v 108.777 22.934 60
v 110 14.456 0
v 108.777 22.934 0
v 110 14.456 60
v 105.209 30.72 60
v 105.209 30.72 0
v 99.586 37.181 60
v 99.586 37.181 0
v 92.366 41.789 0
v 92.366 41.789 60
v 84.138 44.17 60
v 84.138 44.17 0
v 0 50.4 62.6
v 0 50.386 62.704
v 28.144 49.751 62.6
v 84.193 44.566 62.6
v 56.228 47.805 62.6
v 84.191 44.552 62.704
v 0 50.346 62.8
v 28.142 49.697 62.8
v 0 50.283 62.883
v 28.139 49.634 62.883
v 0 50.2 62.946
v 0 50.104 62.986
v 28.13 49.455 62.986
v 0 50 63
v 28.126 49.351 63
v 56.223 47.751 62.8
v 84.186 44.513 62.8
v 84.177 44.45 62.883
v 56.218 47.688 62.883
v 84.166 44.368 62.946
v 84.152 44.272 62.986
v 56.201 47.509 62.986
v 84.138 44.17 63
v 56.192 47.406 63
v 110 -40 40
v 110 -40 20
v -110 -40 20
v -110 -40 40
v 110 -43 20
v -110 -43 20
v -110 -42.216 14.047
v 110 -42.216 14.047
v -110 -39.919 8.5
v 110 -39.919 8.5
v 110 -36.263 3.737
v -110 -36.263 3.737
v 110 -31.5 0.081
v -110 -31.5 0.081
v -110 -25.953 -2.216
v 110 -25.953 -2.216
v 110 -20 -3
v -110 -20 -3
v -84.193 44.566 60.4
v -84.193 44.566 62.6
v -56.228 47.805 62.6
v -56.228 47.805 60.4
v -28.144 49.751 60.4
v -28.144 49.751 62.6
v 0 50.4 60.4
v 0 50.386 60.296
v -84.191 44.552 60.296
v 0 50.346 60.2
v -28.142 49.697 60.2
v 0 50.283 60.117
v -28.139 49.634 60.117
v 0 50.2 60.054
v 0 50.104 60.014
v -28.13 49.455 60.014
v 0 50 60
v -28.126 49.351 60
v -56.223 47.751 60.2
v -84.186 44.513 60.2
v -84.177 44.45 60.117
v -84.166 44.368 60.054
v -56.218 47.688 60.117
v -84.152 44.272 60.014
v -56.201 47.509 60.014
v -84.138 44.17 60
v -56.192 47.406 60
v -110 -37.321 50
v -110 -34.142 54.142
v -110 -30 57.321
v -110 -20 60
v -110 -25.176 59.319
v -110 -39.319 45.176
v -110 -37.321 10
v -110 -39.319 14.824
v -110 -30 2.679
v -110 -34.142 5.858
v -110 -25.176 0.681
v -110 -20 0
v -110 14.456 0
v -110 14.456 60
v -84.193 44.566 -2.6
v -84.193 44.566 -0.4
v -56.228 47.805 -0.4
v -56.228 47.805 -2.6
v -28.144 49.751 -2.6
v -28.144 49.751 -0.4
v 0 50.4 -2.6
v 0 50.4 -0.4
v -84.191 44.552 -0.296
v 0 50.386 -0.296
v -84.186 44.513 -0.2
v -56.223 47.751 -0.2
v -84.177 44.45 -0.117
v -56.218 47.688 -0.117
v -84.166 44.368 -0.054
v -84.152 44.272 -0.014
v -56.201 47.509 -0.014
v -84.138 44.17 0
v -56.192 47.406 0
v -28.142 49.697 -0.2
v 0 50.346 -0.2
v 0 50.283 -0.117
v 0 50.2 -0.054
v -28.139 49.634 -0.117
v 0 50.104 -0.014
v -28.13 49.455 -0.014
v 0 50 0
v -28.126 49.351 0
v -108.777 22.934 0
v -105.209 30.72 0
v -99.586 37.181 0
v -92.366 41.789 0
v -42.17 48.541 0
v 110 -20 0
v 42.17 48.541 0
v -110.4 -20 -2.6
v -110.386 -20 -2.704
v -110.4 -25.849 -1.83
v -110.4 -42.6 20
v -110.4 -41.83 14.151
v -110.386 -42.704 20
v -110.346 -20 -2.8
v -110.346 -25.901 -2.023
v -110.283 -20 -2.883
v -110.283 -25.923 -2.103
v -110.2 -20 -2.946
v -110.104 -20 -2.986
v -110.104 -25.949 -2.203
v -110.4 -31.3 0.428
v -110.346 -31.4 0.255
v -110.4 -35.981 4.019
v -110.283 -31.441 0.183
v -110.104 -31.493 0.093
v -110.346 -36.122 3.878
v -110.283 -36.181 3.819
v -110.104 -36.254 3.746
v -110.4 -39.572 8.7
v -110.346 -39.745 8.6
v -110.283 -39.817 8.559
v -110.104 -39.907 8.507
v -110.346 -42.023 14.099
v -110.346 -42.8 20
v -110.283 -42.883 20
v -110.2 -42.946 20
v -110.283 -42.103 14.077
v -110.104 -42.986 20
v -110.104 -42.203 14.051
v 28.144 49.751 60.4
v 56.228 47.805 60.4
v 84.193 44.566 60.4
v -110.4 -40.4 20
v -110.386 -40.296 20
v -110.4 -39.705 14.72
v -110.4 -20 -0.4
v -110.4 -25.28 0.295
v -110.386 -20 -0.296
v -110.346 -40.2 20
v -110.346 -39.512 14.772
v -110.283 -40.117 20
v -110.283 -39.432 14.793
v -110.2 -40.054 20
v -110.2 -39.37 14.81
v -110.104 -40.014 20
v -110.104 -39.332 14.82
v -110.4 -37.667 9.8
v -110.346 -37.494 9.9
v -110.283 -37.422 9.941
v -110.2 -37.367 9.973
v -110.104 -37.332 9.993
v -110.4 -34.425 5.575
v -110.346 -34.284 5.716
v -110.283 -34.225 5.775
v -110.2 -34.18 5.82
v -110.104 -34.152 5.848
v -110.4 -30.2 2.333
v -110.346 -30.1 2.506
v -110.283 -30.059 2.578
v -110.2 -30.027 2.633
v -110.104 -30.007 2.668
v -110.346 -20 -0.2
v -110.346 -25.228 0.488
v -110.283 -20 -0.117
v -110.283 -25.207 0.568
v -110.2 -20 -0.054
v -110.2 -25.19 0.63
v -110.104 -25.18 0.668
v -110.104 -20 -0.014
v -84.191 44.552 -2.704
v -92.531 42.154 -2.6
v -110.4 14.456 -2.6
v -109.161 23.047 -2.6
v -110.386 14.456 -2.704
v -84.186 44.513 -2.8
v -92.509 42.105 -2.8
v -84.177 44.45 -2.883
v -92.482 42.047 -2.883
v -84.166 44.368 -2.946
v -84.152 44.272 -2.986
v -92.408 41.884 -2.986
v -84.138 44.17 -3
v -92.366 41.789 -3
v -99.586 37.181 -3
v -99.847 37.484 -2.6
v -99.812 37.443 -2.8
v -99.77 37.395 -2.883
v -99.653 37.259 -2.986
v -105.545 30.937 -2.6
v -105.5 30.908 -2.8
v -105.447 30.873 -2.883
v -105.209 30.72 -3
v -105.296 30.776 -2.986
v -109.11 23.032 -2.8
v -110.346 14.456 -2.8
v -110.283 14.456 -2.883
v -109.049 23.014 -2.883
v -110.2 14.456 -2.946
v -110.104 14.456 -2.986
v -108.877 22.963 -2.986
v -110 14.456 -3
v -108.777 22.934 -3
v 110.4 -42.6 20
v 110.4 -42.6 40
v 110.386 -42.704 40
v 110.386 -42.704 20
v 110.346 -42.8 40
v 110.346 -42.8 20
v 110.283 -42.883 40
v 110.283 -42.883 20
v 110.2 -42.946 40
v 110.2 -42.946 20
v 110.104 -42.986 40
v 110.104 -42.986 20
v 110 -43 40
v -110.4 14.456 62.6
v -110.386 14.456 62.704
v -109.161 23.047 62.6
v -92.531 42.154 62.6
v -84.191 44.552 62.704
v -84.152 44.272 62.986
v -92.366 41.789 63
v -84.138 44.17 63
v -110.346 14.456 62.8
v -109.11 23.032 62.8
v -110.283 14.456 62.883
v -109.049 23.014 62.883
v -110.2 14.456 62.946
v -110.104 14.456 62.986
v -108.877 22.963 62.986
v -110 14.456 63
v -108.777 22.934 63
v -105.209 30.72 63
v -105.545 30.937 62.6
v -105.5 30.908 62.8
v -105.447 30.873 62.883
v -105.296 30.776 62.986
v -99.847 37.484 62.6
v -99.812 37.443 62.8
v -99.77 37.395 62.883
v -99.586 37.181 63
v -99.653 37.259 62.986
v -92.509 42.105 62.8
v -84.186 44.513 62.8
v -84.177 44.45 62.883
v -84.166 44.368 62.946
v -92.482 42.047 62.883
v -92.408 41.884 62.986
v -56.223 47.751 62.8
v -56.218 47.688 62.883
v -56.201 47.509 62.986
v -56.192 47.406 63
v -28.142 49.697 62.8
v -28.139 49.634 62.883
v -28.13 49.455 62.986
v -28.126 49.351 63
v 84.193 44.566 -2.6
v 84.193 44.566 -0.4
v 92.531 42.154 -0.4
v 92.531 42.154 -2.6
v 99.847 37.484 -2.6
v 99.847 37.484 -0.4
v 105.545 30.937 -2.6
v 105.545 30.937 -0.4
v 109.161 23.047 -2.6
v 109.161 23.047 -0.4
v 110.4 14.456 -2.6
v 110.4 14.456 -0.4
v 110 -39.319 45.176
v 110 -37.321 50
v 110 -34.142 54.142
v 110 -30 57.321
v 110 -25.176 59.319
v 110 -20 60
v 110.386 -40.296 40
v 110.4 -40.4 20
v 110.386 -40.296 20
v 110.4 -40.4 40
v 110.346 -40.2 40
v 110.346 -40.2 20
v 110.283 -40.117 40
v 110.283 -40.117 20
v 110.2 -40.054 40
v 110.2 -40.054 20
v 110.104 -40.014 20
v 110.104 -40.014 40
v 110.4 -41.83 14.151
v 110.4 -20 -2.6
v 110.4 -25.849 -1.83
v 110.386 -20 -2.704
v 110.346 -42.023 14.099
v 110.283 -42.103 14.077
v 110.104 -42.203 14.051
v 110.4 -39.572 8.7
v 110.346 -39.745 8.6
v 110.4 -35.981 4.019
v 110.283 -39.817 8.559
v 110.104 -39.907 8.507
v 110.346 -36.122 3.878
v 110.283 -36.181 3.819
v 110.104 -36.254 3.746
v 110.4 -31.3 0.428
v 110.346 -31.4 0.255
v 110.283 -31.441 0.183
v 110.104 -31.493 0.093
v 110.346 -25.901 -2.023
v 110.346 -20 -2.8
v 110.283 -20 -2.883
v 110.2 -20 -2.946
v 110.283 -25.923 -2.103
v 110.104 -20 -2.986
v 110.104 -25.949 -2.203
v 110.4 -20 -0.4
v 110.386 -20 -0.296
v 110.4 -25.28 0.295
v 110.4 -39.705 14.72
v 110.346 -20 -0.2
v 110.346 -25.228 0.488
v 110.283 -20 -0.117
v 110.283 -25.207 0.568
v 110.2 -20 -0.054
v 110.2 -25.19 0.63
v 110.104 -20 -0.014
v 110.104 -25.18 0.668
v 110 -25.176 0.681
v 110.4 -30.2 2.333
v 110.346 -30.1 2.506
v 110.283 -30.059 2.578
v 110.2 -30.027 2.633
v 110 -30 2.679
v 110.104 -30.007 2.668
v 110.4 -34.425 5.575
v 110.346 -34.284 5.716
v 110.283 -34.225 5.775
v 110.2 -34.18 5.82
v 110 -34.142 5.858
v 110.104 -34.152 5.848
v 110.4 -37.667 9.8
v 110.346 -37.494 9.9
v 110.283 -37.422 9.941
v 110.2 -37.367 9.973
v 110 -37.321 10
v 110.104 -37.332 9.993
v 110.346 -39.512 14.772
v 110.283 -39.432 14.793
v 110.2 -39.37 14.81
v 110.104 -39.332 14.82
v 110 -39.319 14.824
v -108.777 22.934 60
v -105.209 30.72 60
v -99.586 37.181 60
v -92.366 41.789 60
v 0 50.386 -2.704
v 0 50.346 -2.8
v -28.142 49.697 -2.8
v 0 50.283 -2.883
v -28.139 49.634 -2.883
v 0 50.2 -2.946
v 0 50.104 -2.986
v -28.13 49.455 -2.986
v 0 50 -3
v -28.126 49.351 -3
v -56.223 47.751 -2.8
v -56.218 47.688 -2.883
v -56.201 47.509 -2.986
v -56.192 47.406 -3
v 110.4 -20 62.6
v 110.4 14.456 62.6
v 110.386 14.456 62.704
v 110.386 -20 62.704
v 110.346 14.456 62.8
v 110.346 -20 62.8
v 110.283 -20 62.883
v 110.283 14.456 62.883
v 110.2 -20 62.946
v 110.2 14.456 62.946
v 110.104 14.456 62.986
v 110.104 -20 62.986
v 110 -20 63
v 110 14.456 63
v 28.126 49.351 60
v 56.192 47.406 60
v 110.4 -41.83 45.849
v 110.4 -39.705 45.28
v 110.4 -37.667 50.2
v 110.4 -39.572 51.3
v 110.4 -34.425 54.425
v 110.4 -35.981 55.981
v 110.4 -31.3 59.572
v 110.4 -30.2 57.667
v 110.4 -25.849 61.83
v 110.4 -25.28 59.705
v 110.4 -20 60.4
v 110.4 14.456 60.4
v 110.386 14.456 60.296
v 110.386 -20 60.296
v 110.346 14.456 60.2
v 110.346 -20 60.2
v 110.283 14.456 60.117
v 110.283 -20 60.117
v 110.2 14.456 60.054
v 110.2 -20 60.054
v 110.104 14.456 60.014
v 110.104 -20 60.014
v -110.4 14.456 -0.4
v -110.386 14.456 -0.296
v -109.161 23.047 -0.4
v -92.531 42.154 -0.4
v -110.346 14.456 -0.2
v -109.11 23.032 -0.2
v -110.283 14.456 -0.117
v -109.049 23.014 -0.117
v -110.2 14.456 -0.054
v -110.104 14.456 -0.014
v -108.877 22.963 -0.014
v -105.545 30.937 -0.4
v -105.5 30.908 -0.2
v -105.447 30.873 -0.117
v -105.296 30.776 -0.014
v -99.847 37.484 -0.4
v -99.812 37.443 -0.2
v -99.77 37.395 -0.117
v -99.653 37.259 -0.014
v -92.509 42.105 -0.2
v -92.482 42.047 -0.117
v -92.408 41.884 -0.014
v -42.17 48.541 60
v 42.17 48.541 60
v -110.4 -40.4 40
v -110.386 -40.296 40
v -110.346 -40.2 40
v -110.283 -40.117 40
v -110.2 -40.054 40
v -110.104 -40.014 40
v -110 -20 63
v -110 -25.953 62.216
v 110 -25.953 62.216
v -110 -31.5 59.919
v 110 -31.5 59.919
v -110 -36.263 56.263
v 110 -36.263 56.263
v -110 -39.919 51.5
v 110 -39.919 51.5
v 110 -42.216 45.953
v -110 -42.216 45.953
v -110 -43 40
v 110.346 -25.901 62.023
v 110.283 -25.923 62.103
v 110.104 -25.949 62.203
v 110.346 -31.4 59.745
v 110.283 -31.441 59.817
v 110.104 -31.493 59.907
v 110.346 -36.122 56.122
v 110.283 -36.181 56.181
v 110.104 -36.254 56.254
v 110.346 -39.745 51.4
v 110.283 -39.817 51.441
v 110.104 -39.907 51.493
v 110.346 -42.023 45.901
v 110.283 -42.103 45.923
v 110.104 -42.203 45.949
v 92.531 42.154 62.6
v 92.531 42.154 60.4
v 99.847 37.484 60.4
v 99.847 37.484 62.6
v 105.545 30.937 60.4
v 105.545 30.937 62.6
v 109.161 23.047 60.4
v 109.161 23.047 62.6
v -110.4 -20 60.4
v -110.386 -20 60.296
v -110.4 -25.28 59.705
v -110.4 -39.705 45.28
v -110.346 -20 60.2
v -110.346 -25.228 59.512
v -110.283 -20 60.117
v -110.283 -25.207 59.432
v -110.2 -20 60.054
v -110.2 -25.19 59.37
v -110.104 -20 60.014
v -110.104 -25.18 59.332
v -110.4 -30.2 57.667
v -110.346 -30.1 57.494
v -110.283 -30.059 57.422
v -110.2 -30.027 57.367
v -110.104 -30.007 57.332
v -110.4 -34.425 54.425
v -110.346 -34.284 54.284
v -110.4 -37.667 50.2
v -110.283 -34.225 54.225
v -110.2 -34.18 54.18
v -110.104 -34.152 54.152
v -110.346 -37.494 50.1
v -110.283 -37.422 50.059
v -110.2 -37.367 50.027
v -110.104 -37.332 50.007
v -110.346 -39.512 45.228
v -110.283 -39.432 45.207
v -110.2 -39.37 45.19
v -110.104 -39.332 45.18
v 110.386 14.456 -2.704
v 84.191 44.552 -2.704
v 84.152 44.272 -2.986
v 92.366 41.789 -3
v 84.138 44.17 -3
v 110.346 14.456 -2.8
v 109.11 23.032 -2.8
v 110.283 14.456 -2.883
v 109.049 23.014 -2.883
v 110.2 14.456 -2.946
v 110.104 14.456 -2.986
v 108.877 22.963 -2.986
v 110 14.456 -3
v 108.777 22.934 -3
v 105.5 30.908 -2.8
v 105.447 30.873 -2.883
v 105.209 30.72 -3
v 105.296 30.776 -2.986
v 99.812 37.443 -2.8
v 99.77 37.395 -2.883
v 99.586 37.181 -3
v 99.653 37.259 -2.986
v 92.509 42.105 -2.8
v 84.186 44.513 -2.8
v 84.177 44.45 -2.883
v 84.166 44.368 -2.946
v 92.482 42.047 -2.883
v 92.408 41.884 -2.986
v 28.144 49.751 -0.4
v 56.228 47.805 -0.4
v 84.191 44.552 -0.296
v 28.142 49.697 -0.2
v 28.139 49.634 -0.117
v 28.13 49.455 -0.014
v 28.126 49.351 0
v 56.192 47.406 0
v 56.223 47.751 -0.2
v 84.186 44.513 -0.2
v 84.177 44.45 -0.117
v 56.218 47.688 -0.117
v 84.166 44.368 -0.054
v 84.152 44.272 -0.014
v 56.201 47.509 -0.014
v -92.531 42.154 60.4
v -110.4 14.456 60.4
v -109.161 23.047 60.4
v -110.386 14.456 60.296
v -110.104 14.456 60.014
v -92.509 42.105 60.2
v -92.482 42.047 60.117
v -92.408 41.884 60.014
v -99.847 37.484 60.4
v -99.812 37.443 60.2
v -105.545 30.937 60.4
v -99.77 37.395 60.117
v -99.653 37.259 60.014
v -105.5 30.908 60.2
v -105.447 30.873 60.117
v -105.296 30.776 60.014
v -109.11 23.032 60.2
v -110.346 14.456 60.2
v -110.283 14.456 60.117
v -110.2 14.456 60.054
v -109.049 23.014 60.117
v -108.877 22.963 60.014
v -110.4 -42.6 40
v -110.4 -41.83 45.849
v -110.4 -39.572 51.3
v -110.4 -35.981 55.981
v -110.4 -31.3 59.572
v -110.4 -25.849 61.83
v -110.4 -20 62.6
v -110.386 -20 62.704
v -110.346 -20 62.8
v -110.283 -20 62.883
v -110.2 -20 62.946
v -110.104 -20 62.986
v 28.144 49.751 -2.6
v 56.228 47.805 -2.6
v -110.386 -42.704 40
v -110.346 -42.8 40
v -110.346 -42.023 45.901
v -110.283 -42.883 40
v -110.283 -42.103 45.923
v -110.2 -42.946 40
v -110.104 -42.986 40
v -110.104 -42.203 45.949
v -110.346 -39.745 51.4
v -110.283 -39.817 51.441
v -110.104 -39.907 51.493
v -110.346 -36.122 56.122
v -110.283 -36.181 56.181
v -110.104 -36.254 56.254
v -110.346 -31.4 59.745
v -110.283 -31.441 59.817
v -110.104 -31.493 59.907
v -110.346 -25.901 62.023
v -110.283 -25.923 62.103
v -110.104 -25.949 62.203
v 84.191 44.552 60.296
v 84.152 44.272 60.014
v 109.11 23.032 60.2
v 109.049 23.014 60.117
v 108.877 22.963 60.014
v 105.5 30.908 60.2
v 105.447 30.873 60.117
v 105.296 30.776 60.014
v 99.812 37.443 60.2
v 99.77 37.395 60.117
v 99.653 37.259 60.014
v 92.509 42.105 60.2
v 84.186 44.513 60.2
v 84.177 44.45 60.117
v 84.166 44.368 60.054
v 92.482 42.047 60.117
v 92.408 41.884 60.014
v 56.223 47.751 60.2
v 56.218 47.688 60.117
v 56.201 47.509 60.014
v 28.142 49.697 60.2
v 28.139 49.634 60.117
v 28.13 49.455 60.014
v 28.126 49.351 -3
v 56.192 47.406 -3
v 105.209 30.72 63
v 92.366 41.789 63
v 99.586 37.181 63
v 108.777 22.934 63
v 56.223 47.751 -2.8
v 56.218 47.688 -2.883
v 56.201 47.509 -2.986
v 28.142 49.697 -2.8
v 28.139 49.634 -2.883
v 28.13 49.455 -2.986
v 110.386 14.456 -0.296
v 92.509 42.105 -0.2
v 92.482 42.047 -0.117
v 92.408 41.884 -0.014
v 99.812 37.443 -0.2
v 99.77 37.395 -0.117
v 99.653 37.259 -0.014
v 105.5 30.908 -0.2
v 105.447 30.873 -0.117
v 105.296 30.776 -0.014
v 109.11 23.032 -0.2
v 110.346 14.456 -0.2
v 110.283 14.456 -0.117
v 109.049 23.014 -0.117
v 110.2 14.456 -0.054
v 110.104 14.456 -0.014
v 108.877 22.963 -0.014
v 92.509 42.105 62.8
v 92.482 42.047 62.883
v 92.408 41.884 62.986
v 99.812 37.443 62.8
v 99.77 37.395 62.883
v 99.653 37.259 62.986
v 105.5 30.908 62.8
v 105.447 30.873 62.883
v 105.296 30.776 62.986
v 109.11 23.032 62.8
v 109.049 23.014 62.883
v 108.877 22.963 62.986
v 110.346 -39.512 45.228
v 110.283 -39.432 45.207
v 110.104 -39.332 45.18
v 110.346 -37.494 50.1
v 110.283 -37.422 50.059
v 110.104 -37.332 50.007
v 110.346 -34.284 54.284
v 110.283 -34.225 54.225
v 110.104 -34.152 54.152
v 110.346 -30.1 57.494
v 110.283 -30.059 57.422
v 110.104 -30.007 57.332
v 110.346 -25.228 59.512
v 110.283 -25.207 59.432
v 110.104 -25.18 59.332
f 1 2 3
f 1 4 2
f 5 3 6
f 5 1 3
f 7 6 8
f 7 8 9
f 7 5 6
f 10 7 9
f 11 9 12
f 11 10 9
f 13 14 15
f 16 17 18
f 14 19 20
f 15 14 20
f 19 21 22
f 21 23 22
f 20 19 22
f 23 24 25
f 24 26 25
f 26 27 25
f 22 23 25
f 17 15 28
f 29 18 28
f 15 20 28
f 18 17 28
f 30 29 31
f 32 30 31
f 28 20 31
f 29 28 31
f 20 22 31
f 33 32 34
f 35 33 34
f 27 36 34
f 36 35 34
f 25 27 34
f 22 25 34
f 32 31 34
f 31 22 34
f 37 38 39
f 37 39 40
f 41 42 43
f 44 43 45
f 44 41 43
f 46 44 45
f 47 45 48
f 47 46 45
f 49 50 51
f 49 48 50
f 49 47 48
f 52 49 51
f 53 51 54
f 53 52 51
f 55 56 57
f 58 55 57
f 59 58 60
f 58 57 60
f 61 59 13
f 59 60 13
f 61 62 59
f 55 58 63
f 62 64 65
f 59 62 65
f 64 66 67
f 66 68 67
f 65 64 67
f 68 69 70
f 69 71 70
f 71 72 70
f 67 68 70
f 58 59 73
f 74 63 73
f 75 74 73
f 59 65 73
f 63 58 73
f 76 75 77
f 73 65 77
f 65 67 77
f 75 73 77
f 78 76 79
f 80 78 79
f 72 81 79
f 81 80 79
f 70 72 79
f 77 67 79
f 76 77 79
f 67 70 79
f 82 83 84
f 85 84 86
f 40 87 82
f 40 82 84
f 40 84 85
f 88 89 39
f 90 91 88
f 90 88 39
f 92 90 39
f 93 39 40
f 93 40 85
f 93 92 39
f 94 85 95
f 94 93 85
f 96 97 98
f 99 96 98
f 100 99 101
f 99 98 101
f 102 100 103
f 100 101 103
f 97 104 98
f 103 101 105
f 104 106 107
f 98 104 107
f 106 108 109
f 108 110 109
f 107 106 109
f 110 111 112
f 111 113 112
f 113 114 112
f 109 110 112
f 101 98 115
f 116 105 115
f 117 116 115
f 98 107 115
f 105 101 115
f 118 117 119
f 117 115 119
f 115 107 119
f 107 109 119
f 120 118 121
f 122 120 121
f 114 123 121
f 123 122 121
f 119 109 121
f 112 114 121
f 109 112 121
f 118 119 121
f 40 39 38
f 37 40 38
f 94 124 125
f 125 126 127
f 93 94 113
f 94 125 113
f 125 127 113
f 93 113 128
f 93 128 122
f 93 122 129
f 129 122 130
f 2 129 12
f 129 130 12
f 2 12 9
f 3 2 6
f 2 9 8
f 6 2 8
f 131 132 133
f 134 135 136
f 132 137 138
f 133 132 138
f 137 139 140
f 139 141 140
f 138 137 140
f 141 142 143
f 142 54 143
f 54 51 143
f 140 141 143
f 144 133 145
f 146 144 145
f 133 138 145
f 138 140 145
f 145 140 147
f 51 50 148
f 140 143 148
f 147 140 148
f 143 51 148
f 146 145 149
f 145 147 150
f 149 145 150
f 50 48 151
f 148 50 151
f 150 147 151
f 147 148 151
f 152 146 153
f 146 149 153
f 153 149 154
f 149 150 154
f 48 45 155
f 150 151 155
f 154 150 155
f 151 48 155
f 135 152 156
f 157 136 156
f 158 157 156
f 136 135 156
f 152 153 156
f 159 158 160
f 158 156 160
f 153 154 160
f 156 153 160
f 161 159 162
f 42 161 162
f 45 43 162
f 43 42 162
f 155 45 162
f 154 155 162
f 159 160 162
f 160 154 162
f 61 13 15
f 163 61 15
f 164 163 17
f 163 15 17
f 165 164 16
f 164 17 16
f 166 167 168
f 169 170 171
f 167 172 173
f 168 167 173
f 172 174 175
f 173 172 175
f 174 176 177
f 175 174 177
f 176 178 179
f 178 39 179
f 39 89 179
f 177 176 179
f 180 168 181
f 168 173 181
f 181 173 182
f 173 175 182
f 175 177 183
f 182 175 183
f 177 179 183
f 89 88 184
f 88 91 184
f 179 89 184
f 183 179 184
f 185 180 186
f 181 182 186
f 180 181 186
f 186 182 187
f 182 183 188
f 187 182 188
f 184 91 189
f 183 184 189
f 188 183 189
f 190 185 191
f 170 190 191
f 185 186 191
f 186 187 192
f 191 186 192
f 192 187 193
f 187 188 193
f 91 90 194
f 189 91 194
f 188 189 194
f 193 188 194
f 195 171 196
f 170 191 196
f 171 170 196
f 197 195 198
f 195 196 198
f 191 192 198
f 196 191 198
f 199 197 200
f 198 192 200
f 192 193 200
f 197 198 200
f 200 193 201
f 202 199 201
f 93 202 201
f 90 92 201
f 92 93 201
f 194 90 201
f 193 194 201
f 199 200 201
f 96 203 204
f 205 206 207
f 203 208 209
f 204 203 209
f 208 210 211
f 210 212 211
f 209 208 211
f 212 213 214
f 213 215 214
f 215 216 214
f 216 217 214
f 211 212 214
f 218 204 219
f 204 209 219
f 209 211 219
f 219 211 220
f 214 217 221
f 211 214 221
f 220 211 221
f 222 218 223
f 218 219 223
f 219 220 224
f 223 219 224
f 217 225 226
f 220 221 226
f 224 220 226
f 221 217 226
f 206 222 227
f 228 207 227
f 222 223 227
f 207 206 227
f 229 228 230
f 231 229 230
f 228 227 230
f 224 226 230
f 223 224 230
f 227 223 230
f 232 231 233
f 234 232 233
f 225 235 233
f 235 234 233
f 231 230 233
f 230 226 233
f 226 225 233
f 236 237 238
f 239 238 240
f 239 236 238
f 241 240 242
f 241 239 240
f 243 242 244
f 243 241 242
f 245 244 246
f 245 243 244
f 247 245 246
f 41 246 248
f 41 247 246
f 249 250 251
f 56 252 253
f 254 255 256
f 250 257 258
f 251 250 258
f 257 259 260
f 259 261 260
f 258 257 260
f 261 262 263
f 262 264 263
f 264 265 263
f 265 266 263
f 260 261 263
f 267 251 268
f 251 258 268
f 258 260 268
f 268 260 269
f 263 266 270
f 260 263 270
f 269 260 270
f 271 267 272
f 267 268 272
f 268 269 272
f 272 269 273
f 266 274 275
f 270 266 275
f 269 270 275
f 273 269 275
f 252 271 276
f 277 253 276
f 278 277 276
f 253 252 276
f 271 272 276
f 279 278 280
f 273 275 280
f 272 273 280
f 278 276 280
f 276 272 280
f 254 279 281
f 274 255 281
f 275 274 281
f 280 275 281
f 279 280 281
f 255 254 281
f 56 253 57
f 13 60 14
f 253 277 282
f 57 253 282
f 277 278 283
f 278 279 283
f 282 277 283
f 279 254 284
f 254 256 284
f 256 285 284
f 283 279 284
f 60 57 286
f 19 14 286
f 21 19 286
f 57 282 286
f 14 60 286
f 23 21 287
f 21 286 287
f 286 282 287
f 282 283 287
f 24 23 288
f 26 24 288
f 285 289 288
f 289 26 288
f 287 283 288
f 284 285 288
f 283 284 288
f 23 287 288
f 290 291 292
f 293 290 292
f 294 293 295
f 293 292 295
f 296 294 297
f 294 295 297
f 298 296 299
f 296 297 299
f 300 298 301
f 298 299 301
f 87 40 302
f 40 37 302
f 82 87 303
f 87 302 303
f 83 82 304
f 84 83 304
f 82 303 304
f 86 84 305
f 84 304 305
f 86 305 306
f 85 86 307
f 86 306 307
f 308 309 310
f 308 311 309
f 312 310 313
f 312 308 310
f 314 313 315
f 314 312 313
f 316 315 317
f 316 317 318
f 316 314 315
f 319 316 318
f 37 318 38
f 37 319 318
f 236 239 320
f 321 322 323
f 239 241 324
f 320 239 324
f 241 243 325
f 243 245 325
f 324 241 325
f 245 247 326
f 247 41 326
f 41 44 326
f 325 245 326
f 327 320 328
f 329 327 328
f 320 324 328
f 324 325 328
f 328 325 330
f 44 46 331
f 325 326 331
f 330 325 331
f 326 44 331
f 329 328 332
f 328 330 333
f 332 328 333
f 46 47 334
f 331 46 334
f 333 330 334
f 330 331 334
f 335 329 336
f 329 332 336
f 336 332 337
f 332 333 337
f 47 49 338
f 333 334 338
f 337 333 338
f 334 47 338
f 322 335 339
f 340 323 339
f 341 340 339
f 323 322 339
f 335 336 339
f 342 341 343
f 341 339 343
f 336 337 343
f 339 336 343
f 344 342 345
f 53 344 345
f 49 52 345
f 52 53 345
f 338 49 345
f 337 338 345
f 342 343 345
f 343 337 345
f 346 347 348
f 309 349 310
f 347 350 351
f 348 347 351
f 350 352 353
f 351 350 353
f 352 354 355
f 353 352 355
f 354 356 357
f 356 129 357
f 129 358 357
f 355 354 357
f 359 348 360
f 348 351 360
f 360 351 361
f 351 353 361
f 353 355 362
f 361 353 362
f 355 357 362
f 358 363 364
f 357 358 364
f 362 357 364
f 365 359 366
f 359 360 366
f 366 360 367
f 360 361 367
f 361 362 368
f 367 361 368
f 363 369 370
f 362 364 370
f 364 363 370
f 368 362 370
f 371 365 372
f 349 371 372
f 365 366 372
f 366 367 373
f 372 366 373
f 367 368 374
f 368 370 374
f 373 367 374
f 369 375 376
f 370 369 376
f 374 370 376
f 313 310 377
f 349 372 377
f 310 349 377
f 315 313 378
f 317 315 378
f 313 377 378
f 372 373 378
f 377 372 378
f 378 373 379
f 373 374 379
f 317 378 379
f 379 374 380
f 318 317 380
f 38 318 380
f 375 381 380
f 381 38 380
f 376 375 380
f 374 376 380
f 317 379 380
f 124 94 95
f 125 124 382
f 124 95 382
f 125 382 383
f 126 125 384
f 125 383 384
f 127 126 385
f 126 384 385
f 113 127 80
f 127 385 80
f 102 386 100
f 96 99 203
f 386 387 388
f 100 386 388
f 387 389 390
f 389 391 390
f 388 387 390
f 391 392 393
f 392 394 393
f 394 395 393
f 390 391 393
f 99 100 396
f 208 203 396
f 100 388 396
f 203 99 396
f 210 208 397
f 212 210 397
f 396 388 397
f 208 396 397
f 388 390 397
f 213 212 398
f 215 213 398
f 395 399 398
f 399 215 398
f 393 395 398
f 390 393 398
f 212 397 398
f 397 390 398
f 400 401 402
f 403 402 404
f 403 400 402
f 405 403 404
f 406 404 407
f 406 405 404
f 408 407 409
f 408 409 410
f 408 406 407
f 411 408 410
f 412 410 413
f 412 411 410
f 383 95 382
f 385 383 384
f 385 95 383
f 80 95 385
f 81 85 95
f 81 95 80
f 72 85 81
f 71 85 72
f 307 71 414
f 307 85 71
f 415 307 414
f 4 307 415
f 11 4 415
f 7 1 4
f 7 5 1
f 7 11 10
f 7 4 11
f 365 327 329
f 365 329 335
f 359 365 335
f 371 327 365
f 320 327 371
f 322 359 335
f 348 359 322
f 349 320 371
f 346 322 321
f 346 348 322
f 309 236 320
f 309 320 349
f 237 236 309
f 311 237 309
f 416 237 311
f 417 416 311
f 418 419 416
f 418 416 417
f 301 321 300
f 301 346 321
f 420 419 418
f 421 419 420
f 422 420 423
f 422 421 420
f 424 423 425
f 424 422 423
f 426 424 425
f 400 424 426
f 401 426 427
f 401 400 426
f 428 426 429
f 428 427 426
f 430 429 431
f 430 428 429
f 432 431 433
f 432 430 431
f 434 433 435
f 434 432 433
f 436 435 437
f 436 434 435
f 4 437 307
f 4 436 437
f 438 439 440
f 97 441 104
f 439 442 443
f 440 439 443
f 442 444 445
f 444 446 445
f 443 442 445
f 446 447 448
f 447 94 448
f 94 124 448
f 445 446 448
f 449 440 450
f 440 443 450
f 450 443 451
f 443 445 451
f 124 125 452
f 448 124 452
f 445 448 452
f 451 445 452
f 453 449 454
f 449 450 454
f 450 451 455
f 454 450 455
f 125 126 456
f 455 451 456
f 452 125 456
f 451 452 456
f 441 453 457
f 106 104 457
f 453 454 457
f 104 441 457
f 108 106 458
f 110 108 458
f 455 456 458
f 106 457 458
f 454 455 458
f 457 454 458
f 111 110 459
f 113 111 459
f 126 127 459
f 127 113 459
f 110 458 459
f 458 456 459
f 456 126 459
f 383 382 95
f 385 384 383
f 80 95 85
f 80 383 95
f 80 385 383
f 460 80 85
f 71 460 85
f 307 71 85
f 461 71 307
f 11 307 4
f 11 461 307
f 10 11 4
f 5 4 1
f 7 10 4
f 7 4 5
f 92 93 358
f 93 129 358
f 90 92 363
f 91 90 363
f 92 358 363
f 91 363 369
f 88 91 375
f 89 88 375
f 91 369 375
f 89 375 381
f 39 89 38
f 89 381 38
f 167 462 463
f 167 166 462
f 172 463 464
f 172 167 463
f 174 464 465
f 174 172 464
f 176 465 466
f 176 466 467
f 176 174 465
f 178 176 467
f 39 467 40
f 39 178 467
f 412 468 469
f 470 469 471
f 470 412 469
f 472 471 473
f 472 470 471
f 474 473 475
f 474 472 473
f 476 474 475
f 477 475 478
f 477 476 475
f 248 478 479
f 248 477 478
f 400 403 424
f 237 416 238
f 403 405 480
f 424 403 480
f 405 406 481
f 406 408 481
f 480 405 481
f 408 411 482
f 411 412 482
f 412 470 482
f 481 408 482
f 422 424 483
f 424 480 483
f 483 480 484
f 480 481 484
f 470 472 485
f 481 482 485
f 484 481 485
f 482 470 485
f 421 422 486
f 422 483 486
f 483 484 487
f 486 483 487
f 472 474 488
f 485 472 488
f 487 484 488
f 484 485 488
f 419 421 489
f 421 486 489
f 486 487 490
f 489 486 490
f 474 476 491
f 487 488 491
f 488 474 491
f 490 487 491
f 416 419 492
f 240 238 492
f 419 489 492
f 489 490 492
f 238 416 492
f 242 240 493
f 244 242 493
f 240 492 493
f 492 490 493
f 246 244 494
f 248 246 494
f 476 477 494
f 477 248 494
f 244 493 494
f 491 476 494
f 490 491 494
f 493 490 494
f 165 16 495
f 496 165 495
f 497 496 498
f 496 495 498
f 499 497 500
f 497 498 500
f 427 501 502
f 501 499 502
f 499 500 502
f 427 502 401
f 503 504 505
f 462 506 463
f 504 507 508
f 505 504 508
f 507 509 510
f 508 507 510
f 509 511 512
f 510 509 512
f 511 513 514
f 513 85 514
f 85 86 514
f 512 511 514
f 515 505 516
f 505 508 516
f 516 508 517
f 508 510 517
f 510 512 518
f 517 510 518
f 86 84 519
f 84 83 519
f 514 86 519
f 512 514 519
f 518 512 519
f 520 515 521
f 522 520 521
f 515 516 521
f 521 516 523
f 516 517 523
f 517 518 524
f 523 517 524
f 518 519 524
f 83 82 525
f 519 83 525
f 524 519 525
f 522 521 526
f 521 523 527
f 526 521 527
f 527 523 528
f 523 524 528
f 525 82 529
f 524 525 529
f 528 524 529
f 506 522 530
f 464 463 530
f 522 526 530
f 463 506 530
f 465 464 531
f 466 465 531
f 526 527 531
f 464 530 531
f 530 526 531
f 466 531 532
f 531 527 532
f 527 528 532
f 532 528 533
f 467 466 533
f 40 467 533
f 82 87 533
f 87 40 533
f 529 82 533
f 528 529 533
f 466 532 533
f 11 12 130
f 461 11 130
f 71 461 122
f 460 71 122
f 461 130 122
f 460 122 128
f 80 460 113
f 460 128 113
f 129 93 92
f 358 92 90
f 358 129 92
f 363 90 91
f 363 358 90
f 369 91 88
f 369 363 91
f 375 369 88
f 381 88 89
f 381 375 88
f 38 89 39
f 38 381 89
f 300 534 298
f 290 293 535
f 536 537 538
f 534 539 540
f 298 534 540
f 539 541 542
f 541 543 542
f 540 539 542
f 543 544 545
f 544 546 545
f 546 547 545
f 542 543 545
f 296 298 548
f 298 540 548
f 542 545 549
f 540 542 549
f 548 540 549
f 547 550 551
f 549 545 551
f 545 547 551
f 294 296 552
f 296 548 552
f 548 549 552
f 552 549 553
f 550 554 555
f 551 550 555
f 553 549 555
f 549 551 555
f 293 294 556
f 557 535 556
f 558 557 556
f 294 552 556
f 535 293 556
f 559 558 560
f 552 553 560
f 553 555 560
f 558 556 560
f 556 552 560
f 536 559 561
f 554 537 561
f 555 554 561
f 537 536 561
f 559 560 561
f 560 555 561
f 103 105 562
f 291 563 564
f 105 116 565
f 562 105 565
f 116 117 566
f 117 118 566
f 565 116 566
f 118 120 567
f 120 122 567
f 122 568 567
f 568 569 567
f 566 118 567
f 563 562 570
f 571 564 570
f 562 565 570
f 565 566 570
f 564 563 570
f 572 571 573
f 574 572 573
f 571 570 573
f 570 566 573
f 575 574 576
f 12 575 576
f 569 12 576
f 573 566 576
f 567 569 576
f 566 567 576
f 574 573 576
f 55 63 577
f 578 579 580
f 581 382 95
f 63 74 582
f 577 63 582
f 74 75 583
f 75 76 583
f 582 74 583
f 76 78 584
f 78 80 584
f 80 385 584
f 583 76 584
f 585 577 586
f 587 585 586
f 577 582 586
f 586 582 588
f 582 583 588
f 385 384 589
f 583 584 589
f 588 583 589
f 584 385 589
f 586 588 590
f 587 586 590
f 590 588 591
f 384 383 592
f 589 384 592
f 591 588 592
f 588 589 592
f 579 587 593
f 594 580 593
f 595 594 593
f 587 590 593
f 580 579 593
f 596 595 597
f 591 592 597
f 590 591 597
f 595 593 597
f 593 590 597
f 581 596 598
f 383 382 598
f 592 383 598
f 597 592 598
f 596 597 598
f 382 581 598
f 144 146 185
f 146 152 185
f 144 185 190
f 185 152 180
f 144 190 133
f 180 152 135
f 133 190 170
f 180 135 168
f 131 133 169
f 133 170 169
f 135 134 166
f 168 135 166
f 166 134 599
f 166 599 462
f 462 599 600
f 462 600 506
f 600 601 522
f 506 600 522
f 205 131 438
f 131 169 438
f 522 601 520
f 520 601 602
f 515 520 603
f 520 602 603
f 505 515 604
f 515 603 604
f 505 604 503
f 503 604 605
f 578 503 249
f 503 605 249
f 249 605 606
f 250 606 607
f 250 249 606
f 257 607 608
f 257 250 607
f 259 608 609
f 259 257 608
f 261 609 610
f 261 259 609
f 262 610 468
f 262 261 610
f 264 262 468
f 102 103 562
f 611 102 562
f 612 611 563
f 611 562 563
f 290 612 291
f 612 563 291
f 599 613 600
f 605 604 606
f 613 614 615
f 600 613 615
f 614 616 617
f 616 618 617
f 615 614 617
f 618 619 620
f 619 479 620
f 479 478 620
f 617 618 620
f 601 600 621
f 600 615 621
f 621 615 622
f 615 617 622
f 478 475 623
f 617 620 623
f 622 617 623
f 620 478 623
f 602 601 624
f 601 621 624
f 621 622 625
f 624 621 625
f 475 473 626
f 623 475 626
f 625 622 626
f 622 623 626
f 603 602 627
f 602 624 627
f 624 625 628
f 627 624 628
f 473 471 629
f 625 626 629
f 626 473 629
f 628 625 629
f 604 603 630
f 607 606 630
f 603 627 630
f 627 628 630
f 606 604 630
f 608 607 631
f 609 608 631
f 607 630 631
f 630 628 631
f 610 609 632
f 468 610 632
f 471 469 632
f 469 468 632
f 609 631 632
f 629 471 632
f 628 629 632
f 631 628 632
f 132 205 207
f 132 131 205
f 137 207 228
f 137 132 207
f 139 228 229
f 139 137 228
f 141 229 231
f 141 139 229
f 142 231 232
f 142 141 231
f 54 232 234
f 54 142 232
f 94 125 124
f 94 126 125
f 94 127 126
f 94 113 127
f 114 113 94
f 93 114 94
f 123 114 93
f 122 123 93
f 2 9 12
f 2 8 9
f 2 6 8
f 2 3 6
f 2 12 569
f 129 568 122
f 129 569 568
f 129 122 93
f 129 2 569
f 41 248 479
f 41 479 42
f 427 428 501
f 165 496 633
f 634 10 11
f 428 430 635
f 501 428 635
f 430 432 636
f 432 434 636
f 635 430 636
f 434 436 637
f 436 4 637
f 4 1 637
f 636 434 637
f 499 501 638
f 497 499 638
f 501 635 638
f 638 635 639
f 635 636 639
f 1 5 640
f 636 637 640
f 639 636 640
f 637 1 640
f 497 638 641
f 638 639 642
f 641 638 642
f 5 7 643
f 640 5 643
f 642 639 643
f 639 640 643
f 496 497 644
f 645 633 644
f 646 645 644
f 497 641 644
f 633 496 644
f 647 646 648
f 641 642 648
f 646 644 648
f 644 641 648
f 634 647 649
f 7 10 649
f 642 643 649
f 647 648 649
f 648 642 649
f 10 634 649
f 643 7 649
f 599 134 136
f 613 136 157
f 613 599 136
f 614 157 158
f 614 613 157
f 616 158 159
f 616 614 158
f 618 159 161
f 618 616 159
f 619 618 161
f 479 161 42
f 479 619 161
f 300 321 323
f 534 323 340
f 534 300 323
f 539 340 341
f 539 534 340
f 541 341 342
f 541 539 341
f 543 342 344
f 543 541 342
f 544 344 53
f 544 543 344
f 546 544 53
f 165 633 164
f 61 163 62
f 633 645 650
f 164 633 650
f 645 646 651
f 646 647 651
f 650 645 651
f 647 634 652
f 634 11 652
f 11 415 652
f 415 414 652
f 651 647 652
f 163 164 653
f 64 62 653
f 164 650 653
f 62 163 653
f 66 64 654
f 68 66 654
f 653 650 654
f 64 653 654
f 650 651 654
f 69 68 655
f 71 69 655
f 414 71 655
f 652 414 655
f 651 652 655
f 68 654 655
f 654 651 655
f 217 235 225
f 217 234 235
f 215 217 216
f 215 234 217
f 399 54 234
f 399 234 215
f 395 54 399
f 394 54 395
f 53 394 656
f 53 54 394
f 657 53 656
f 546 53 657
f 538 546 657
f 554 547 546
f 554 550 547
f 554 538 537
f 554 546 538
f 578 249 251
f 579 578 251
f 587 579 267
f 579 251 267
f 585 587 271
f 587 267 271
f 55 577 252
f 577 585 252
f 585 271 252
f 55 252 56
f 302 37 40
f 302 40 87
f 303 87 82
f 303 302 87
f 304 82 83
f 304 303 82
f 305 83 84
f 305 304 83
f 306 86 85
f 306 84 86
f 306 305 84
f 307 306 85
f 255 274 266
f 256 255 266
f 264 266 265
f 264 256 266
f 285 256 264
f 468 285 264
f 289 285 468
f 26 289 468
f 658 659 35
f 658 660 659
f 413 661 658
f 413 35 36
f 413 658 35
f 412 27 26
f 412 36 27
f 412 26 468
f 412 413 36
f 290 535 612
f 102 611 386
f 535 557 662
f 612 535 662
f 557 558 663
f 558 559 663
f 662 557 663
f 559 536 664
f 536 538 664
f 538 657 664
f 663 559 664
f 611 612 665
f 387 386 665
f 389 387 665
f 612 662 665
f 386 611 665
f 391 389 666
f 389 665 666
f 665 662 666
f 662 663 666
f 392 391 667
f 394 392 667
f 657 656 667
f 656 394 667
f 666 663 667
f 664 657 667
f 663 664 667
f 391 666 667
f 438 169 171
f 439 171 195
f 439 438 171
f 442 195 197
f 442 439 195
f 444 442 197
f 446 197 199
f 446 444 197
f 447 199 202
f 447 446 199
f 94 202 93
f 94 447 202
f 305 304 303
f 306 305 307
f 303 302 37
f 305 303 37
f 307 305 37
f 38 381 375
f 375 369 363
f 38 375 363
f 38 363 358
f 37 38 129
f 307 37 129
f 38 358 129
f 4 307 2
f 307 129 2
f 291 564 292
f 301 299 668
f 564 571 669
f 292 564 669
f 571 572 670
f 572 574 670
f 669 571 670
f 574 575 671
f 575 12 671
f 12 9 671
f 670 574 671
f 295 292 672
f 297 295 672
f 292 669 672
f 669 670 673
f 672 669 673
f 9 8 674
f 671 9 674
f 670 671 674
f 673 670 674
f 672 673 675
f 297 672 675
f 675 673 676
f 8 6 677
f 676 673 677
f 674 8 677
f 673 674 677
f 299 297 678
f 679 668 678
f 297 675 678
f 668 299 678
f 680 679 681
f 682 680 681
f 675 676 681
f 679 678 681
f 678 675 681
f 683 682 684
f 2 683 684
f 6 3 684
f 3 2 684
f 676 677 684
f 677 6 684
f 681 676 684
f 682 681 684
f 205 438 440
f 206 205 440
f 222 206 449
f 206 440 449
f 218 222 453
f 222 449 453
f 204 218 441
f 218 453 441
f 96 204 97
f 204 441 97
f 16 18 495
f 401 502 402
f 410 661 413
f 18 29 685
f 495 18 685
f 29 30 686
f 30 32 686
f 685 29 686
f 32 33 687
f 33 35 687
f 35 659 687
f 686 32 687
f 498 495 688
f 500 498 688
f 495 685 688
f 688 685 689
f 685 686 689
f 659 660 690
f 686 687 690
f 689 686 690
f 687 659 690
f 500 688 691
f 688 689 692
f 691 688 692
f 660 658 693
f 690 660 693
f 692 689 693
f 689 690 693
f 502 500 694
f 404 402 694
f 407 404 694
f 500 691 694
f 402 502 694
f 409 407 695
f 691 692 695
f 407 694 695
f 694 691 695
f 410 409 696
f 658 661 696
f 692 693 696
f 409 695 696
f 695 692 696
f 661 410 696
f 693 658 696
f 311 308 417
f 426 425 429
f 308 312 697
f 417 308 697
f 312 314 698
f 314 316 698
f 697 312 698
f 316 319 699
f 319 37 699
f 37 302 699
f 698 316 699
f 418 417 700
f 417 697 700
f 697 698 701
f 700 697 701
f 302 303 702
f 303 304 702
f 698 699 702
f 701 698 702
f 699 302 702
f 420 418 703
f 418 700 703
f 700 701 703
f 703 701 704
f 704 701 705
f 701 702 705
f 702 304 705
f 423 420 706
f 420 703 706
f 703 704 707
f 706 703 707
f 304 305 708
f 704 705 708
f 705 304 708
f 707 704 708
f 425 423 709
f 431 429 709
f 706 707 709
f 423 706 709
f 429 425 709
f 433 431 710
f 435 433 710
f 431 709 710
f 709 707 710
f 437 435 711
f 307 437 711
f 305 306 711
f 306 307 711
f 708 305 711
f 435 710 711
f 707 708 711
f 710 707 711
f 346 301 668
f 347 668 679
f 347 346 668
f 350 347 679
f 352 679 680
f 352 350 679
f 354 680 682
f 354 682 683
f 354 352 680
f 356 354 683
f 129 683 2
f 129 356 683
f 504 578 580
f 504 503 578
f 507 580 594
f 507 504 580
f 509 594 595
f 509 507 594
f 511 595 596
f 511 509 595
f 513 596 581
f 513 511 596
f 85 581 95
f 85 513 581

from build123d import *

# Parameters (mm, degrees)
F0_W     = 220
F0_H     = 80
F1_DEPTH = 60
F2_R     = 30
F3_R     = 20
F5_DEPTH = 0.4
F6_DEPTH = 220.4
F9_DEPTH = 66
F10_R    = 0.4


with BuildPart() as f1:
    # F0 (on Top) → F1 (new body)
    with BuildSketch(Plane.XY):
        Rectangle(F0_W, F0_H)
        with BuildLine():
            Line((-110, 40), (110, 40))
            ThreePointArc((110, 40), (0, 50), (-110, 40))
        make_face()
    extrude(amount=F1_DEPTH)

    # F2
    f2_edges = [f1.edges().sort_by_distance(p)[0] for p in [
        (-110, 40, 30),
        (110, 40, 30),
    ]]
    fillet(f2_edges, radius=F2_R)

    # F3
    f3_edges = [f1.edges().sort_by_distance(p)[0] for p in [
        (0, -40, 60),
        (0, -40, 0),
    ]]
    fillet(f3_edges, radius=F3_R)


with BuildPart() as f5:
    # F4 (on face) → F5 (new body)
    with BuildSketch(Plane.YZ.offset(110)):
        with BuildLine():
            Line((-20, -3), (14.4562646538, -3))
            Line((14.4562646538, -3), (50.4, -3))
            Line((50.4, -3), (50.4, 0))
            Line((50.4, 0), (50, 0))
            Line((50, 0), (44.1695197221, 0))
            Line((44.1695197221, 0), (14.4562646538, 0))
            Line((14.4562646538, 0), (-20, 0))
            ThreePointArc((-20, 0), (-34.1421356237, 5.8578643763), (-40, 20))
            Line((-40, 20), (-40, 40))
            ThreePointArc((-40, 40), (-34.1421356237, 54.1421356237), (-20, 60))
            Line((-20, 60), (14.4562646538, 60))
            Line((14.4562646538, 60), (44.1695197221, 60))
            Line((44.1695197221, 60), (50, 60))
            Line((50, 60), (50.4, 60))
            Line((50.4, 60), (50.4, 63))
            Line((50.4, 63), (14.4562646538, 63))
            Line((14.4562646538, 63), (-20, 63))
            ThreePointArc((-20, 63), (-36.2634559673, 56.2634559673), (-43, 40))
            Line((-43, 40), (-43, 20))
            ThreePointArc((-43, 20), (-36.2634559673, 3.7365440327), (-20, -3))
        make_face()
    extrude(amount=F5_DEPTH)

    # F6 (add): a face of the model
    f6_faces = [f5.faces().sort_by_distance(p)[0] for p in [
        (110, -35.4547669047, 55.4547669047),
    ]]
    extrude(f6_faces, amount=F6_DEPTH)

    # F7: union 

    # F8 (on face) → F9 (cut, through all)
    with BuildSketch(Plane.XY.offset(63)):
        with BuildLine():
            Line((-110.4, 50.4), (-110.4, 14.4562646538))
            ThreePointArc((-110.4, 14.4562646538), (-102.9306600955, 34.4148424485), (-84.1931034483, 44.5656964563))
            ThreePointArc((-84.1931034483, 44.5656964563), (-42.1975051576, 48.9396772739), (0, 50.4))
            Line((0, 50.4), (-110.4, 50.4))
        make_face()
        with BuildLine():
            Line((110.4, 50.4), (0, 50.4))
            ThreePointArc((0, 50.4), (42.1975051575, 48.9396772739), (84.1931034483, 44.5656964563))
            ThreePointArc((84.1931034483, 44.5656964563), (102.9306600955, 34.4148424485), (110.4, 14.4562646538))
            Line((110.4, 14.4562646538), (110.4, 50.4))
        make_face()
    extrude(amount=-F9_DEPTH, mode=Mode.SUBTRACT)

    # F10
    f10_edges = [f5.edges().sort_by_distance(p)[0] for p in [
        (110.4, -2.771868, 63),
        (110.4, 14.456265, 61.5),
        (110.4, -2.771868, 60),
        (110.4, -34.142136, 54.142136),
        (110.4, -40, 30),
        (110.4, -34.142136, 5.857864),
        (110.4, -2.771868, 0),
        (110.4, 14.456265, -1.5),
        (110.4, -2.771868, -3),
        (110.4, -36.263456, 3.736544),
        (110.4, -43, 30),
        (110.4, -36.263456, 56.263456),
        (102.93066, 34.414842, 0),
        (102.93066, 34.414842, -3),
        (84.193103, 44.565696, -1.5),
        (102.93066, 34.414842, 63),
        (102.93066, 34.414842, 60),
        (84.193103, 44.565696, 61.5),
        (-102.93066, 34.414842, 0),
        (-84.193103, 44.565696, -1.5),
        (-102.93066, 34.414842, -3),
        (-110.4, 14.456265, -1.5),
        (-102.93066, 34.414842, 63),
        (-84.193103, 44.565696, 61.5),
        (-102.93066, 34.414842, 60),
        (-110.4, 14.456265, 61.5),
        (-110.4, -2.771868, 63),
        (-110.4, -2.771868, 60),
        (-110.4, -34.142136, 54.142136),
        (-110.4, -40, 30),
        (-110.4, -34.142136, 5.857864),
        (-110.4, -2.771868, 0),
        (-110.4, -2.771868, -3),
        (-110.4, -36.263456, 3.736544),
        (-110.4, -43, 30),
        (-110.4, -36.263456, 56.263456),
        (0, 50.4, -3),
        (0, 50.4, 0),
        (0, 50.4, 60),
        (0, 50.4, 63),
    ]]
    fillet(f10_edges, radius=F10_R)


solid = Compound([f1.part, f5.part])
